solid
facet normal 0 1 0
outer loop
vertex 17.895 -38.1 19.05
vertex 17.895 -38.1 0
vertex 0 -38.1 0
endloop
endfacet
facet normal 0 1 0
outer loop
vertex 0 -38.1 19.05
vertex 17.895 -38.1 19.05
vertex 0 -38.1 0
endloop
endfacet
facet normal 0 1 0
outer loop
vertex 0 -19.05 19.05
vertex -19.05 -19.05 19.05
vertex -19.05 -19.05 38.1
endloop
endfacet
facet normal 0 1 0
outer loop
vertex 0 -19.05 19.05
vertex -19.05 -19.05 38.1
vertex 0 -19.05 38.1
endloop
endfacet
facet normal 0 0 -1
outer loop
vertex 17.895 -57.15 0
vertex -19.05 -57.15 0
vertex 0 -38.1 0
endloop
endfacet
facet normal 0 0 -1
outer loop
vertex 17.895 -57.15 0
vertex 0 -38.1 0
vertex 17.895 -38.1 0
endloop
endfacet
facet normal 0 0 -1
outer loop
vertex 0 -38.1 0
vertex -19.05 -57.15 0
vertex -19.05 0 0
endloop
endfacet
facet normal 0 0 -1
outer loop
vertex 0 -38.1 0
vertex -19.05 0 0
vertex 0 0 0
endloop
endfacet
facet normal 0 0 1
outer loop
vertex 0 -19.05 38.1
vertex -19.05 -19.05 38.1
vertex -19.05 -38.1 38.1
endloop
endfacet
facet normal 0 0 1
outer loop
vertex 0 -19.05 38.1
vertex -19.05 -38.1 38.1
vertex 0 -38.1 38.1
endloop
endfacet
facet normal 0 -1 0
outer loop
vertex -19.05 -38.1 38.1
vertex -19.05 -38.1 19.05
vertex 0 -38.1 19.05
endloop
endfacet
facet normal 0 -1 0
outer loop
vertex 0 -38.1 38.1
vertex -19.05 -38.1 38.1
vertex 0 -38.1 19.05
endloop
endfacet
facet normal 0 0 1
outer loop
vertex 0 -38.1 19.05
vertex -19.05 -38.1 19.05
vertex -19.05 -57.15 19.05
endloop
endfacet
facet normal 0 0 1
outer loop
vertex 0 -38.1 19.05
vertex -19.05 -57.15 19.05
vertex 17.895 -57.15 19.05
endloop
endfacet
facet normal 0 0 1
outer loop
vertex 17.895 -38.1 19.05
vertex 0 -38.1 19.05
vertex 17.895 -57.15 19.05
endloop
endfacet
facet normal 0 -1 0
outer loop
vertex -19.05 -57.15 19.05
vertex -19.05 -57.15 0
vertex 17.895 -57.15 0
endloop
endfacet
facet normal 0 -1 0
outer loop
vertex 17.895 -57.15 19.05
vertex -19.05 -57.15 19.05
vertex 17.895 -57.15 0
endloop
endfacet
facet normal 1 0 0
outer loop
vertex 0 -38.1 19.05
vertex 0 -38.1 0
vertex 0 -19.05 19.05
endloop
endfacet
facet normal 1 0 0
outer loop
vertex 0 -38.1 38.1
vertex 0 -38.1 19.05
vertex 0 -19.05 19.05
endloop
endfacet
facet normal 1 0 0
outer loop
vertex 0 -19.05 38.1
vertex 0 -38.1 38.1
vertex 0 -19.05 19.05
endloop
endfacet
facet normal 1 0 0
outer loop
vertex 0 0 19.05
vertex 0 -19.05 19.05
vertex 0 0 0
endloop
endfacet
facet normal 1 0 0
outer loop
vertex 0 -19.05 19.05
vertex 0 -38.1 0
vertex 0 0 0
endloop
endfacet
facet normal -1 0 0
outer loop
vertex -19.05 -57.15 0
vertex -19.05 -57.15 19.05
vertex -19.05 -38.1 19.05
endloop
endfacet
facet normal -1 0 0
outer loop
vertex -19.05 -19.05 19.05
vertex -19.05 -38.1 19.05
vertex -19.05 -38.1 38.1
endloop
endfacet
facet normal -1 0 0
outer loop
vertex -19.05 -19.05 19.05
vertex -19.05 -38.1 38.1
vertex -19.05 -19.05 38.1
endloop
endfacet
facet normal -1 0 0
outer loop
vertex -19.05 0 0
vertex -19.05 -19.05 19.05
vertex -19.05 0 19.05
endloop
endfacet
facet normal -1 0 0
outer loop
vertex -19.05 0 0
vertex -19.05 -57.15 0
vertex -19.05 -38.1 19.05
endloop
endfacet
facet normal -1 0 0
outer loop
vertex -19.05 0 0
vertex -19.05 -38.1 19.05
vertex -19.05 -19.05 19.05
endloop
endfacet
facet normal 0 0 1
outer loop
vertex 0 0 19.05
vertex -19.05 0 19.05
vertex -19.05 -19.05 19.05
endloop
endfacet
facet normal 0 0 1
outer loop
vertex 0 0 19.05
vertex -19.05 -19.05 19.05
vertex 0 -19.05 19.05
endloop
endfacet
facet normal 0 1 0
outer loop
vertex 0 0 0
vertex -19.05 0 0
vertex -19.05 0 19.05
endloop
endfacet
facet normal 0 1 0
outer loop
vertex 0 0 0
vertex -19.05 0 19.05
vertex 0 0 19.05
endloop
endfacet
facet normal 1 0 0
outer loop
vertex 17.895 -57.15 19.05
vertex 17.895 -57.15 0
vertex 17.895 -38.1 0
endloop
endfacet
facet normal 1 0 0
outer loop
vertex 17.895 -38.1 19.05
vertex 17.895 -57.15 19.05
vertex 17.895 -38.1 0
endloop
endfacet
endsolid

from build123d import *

# Parameters (mm, degrees)
F1_DEPTH = 19.05
F0_W     = 19.05
F0_H     = 19.05
F2_DEPTH = 38.1
F3_DEPTH = 19.05


with BuildPart() as f1:
    # F0 (on Top) → F1 (new body)
    with BuildSketch(Plane.XY):
        Polygon((17.895463, -38.1), (0, -38.1), (-19.05, -38.1), (-19.05, -57.15), (17.895463, -57.15), align=None)
    extrude(amount=F1_DEPTH)

    # F0 (on Top) → F2 (join)
    with BuildSketch(Plane.XY):
        with Locations((-9.525, -28.575)):
            Rectangle(F0_W, F0_H)
    extrude(amount=F2_DEPTH)

    # F0 (on Top) → F3 (join)
    with BuildSketch(Plane.XY):
        with Locations((-9.525, -9.525)):
            Rectangle(F0_W, F0_H)
    extrude(amount=F3_DEPTH)


solid = f1.part
